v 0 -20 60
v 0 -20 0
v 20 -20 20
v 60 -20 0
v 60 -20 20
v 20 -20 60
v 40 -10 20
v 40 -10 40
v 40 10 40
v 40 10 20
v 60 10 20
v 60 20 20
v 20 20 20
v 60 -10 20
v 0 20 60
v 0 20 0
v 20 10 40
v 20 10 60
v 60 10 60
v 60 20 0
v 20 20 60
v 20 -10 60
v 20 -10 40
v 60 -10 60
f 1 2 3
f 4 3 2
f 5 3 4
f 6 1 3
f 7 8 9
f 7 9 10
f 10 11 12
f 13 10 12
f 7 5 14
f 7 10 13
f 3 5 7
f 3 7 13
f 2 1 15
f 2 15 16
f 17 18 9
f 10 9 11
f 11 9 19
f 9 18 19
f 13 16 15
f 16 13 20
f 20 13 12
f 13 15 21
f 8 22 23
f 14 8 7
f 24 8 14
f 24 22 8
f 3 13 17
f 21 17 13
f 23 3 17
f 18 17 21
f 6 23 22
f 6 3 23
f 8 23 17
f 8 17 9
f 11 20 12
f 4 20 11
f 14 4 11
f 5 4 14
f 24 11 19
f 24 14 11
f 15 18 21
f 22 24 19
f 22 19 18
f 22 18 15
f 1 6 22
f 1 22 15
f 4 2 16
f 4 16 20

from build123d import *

# Parameters (mm, degrees)
F1_DEPTH = 20
F2_DEPTH = 10


with BuildPart() as f1:
    # F0 (on Front) → F1 (new body, symmetric)
    with BuildSketch(Plane.XZ):
        Polygon((0, 60), (0, 0), (60, 0), (60, 20), (40, 20), (20, 20), (20, 40), (20, 60), align=None)
    extrude(amount=F1_DEPTH, both=True)

    # F0 (on Front) → F2 (join, symmetric)
    with BuildSketch(Plane.XZ):
        Polygon((0, 60), (0, 0), (60, 0), (60, 20), (40, 20), (20, 20), (20, 40), (20, 60), align=None)
        Polygon((60, 60), (20, 60), (20, 40), (40, 40), (40, 20), (60, 20), align=None)
    extrude(amount=F2_DEPTH, both=True)


solid = f1.part
